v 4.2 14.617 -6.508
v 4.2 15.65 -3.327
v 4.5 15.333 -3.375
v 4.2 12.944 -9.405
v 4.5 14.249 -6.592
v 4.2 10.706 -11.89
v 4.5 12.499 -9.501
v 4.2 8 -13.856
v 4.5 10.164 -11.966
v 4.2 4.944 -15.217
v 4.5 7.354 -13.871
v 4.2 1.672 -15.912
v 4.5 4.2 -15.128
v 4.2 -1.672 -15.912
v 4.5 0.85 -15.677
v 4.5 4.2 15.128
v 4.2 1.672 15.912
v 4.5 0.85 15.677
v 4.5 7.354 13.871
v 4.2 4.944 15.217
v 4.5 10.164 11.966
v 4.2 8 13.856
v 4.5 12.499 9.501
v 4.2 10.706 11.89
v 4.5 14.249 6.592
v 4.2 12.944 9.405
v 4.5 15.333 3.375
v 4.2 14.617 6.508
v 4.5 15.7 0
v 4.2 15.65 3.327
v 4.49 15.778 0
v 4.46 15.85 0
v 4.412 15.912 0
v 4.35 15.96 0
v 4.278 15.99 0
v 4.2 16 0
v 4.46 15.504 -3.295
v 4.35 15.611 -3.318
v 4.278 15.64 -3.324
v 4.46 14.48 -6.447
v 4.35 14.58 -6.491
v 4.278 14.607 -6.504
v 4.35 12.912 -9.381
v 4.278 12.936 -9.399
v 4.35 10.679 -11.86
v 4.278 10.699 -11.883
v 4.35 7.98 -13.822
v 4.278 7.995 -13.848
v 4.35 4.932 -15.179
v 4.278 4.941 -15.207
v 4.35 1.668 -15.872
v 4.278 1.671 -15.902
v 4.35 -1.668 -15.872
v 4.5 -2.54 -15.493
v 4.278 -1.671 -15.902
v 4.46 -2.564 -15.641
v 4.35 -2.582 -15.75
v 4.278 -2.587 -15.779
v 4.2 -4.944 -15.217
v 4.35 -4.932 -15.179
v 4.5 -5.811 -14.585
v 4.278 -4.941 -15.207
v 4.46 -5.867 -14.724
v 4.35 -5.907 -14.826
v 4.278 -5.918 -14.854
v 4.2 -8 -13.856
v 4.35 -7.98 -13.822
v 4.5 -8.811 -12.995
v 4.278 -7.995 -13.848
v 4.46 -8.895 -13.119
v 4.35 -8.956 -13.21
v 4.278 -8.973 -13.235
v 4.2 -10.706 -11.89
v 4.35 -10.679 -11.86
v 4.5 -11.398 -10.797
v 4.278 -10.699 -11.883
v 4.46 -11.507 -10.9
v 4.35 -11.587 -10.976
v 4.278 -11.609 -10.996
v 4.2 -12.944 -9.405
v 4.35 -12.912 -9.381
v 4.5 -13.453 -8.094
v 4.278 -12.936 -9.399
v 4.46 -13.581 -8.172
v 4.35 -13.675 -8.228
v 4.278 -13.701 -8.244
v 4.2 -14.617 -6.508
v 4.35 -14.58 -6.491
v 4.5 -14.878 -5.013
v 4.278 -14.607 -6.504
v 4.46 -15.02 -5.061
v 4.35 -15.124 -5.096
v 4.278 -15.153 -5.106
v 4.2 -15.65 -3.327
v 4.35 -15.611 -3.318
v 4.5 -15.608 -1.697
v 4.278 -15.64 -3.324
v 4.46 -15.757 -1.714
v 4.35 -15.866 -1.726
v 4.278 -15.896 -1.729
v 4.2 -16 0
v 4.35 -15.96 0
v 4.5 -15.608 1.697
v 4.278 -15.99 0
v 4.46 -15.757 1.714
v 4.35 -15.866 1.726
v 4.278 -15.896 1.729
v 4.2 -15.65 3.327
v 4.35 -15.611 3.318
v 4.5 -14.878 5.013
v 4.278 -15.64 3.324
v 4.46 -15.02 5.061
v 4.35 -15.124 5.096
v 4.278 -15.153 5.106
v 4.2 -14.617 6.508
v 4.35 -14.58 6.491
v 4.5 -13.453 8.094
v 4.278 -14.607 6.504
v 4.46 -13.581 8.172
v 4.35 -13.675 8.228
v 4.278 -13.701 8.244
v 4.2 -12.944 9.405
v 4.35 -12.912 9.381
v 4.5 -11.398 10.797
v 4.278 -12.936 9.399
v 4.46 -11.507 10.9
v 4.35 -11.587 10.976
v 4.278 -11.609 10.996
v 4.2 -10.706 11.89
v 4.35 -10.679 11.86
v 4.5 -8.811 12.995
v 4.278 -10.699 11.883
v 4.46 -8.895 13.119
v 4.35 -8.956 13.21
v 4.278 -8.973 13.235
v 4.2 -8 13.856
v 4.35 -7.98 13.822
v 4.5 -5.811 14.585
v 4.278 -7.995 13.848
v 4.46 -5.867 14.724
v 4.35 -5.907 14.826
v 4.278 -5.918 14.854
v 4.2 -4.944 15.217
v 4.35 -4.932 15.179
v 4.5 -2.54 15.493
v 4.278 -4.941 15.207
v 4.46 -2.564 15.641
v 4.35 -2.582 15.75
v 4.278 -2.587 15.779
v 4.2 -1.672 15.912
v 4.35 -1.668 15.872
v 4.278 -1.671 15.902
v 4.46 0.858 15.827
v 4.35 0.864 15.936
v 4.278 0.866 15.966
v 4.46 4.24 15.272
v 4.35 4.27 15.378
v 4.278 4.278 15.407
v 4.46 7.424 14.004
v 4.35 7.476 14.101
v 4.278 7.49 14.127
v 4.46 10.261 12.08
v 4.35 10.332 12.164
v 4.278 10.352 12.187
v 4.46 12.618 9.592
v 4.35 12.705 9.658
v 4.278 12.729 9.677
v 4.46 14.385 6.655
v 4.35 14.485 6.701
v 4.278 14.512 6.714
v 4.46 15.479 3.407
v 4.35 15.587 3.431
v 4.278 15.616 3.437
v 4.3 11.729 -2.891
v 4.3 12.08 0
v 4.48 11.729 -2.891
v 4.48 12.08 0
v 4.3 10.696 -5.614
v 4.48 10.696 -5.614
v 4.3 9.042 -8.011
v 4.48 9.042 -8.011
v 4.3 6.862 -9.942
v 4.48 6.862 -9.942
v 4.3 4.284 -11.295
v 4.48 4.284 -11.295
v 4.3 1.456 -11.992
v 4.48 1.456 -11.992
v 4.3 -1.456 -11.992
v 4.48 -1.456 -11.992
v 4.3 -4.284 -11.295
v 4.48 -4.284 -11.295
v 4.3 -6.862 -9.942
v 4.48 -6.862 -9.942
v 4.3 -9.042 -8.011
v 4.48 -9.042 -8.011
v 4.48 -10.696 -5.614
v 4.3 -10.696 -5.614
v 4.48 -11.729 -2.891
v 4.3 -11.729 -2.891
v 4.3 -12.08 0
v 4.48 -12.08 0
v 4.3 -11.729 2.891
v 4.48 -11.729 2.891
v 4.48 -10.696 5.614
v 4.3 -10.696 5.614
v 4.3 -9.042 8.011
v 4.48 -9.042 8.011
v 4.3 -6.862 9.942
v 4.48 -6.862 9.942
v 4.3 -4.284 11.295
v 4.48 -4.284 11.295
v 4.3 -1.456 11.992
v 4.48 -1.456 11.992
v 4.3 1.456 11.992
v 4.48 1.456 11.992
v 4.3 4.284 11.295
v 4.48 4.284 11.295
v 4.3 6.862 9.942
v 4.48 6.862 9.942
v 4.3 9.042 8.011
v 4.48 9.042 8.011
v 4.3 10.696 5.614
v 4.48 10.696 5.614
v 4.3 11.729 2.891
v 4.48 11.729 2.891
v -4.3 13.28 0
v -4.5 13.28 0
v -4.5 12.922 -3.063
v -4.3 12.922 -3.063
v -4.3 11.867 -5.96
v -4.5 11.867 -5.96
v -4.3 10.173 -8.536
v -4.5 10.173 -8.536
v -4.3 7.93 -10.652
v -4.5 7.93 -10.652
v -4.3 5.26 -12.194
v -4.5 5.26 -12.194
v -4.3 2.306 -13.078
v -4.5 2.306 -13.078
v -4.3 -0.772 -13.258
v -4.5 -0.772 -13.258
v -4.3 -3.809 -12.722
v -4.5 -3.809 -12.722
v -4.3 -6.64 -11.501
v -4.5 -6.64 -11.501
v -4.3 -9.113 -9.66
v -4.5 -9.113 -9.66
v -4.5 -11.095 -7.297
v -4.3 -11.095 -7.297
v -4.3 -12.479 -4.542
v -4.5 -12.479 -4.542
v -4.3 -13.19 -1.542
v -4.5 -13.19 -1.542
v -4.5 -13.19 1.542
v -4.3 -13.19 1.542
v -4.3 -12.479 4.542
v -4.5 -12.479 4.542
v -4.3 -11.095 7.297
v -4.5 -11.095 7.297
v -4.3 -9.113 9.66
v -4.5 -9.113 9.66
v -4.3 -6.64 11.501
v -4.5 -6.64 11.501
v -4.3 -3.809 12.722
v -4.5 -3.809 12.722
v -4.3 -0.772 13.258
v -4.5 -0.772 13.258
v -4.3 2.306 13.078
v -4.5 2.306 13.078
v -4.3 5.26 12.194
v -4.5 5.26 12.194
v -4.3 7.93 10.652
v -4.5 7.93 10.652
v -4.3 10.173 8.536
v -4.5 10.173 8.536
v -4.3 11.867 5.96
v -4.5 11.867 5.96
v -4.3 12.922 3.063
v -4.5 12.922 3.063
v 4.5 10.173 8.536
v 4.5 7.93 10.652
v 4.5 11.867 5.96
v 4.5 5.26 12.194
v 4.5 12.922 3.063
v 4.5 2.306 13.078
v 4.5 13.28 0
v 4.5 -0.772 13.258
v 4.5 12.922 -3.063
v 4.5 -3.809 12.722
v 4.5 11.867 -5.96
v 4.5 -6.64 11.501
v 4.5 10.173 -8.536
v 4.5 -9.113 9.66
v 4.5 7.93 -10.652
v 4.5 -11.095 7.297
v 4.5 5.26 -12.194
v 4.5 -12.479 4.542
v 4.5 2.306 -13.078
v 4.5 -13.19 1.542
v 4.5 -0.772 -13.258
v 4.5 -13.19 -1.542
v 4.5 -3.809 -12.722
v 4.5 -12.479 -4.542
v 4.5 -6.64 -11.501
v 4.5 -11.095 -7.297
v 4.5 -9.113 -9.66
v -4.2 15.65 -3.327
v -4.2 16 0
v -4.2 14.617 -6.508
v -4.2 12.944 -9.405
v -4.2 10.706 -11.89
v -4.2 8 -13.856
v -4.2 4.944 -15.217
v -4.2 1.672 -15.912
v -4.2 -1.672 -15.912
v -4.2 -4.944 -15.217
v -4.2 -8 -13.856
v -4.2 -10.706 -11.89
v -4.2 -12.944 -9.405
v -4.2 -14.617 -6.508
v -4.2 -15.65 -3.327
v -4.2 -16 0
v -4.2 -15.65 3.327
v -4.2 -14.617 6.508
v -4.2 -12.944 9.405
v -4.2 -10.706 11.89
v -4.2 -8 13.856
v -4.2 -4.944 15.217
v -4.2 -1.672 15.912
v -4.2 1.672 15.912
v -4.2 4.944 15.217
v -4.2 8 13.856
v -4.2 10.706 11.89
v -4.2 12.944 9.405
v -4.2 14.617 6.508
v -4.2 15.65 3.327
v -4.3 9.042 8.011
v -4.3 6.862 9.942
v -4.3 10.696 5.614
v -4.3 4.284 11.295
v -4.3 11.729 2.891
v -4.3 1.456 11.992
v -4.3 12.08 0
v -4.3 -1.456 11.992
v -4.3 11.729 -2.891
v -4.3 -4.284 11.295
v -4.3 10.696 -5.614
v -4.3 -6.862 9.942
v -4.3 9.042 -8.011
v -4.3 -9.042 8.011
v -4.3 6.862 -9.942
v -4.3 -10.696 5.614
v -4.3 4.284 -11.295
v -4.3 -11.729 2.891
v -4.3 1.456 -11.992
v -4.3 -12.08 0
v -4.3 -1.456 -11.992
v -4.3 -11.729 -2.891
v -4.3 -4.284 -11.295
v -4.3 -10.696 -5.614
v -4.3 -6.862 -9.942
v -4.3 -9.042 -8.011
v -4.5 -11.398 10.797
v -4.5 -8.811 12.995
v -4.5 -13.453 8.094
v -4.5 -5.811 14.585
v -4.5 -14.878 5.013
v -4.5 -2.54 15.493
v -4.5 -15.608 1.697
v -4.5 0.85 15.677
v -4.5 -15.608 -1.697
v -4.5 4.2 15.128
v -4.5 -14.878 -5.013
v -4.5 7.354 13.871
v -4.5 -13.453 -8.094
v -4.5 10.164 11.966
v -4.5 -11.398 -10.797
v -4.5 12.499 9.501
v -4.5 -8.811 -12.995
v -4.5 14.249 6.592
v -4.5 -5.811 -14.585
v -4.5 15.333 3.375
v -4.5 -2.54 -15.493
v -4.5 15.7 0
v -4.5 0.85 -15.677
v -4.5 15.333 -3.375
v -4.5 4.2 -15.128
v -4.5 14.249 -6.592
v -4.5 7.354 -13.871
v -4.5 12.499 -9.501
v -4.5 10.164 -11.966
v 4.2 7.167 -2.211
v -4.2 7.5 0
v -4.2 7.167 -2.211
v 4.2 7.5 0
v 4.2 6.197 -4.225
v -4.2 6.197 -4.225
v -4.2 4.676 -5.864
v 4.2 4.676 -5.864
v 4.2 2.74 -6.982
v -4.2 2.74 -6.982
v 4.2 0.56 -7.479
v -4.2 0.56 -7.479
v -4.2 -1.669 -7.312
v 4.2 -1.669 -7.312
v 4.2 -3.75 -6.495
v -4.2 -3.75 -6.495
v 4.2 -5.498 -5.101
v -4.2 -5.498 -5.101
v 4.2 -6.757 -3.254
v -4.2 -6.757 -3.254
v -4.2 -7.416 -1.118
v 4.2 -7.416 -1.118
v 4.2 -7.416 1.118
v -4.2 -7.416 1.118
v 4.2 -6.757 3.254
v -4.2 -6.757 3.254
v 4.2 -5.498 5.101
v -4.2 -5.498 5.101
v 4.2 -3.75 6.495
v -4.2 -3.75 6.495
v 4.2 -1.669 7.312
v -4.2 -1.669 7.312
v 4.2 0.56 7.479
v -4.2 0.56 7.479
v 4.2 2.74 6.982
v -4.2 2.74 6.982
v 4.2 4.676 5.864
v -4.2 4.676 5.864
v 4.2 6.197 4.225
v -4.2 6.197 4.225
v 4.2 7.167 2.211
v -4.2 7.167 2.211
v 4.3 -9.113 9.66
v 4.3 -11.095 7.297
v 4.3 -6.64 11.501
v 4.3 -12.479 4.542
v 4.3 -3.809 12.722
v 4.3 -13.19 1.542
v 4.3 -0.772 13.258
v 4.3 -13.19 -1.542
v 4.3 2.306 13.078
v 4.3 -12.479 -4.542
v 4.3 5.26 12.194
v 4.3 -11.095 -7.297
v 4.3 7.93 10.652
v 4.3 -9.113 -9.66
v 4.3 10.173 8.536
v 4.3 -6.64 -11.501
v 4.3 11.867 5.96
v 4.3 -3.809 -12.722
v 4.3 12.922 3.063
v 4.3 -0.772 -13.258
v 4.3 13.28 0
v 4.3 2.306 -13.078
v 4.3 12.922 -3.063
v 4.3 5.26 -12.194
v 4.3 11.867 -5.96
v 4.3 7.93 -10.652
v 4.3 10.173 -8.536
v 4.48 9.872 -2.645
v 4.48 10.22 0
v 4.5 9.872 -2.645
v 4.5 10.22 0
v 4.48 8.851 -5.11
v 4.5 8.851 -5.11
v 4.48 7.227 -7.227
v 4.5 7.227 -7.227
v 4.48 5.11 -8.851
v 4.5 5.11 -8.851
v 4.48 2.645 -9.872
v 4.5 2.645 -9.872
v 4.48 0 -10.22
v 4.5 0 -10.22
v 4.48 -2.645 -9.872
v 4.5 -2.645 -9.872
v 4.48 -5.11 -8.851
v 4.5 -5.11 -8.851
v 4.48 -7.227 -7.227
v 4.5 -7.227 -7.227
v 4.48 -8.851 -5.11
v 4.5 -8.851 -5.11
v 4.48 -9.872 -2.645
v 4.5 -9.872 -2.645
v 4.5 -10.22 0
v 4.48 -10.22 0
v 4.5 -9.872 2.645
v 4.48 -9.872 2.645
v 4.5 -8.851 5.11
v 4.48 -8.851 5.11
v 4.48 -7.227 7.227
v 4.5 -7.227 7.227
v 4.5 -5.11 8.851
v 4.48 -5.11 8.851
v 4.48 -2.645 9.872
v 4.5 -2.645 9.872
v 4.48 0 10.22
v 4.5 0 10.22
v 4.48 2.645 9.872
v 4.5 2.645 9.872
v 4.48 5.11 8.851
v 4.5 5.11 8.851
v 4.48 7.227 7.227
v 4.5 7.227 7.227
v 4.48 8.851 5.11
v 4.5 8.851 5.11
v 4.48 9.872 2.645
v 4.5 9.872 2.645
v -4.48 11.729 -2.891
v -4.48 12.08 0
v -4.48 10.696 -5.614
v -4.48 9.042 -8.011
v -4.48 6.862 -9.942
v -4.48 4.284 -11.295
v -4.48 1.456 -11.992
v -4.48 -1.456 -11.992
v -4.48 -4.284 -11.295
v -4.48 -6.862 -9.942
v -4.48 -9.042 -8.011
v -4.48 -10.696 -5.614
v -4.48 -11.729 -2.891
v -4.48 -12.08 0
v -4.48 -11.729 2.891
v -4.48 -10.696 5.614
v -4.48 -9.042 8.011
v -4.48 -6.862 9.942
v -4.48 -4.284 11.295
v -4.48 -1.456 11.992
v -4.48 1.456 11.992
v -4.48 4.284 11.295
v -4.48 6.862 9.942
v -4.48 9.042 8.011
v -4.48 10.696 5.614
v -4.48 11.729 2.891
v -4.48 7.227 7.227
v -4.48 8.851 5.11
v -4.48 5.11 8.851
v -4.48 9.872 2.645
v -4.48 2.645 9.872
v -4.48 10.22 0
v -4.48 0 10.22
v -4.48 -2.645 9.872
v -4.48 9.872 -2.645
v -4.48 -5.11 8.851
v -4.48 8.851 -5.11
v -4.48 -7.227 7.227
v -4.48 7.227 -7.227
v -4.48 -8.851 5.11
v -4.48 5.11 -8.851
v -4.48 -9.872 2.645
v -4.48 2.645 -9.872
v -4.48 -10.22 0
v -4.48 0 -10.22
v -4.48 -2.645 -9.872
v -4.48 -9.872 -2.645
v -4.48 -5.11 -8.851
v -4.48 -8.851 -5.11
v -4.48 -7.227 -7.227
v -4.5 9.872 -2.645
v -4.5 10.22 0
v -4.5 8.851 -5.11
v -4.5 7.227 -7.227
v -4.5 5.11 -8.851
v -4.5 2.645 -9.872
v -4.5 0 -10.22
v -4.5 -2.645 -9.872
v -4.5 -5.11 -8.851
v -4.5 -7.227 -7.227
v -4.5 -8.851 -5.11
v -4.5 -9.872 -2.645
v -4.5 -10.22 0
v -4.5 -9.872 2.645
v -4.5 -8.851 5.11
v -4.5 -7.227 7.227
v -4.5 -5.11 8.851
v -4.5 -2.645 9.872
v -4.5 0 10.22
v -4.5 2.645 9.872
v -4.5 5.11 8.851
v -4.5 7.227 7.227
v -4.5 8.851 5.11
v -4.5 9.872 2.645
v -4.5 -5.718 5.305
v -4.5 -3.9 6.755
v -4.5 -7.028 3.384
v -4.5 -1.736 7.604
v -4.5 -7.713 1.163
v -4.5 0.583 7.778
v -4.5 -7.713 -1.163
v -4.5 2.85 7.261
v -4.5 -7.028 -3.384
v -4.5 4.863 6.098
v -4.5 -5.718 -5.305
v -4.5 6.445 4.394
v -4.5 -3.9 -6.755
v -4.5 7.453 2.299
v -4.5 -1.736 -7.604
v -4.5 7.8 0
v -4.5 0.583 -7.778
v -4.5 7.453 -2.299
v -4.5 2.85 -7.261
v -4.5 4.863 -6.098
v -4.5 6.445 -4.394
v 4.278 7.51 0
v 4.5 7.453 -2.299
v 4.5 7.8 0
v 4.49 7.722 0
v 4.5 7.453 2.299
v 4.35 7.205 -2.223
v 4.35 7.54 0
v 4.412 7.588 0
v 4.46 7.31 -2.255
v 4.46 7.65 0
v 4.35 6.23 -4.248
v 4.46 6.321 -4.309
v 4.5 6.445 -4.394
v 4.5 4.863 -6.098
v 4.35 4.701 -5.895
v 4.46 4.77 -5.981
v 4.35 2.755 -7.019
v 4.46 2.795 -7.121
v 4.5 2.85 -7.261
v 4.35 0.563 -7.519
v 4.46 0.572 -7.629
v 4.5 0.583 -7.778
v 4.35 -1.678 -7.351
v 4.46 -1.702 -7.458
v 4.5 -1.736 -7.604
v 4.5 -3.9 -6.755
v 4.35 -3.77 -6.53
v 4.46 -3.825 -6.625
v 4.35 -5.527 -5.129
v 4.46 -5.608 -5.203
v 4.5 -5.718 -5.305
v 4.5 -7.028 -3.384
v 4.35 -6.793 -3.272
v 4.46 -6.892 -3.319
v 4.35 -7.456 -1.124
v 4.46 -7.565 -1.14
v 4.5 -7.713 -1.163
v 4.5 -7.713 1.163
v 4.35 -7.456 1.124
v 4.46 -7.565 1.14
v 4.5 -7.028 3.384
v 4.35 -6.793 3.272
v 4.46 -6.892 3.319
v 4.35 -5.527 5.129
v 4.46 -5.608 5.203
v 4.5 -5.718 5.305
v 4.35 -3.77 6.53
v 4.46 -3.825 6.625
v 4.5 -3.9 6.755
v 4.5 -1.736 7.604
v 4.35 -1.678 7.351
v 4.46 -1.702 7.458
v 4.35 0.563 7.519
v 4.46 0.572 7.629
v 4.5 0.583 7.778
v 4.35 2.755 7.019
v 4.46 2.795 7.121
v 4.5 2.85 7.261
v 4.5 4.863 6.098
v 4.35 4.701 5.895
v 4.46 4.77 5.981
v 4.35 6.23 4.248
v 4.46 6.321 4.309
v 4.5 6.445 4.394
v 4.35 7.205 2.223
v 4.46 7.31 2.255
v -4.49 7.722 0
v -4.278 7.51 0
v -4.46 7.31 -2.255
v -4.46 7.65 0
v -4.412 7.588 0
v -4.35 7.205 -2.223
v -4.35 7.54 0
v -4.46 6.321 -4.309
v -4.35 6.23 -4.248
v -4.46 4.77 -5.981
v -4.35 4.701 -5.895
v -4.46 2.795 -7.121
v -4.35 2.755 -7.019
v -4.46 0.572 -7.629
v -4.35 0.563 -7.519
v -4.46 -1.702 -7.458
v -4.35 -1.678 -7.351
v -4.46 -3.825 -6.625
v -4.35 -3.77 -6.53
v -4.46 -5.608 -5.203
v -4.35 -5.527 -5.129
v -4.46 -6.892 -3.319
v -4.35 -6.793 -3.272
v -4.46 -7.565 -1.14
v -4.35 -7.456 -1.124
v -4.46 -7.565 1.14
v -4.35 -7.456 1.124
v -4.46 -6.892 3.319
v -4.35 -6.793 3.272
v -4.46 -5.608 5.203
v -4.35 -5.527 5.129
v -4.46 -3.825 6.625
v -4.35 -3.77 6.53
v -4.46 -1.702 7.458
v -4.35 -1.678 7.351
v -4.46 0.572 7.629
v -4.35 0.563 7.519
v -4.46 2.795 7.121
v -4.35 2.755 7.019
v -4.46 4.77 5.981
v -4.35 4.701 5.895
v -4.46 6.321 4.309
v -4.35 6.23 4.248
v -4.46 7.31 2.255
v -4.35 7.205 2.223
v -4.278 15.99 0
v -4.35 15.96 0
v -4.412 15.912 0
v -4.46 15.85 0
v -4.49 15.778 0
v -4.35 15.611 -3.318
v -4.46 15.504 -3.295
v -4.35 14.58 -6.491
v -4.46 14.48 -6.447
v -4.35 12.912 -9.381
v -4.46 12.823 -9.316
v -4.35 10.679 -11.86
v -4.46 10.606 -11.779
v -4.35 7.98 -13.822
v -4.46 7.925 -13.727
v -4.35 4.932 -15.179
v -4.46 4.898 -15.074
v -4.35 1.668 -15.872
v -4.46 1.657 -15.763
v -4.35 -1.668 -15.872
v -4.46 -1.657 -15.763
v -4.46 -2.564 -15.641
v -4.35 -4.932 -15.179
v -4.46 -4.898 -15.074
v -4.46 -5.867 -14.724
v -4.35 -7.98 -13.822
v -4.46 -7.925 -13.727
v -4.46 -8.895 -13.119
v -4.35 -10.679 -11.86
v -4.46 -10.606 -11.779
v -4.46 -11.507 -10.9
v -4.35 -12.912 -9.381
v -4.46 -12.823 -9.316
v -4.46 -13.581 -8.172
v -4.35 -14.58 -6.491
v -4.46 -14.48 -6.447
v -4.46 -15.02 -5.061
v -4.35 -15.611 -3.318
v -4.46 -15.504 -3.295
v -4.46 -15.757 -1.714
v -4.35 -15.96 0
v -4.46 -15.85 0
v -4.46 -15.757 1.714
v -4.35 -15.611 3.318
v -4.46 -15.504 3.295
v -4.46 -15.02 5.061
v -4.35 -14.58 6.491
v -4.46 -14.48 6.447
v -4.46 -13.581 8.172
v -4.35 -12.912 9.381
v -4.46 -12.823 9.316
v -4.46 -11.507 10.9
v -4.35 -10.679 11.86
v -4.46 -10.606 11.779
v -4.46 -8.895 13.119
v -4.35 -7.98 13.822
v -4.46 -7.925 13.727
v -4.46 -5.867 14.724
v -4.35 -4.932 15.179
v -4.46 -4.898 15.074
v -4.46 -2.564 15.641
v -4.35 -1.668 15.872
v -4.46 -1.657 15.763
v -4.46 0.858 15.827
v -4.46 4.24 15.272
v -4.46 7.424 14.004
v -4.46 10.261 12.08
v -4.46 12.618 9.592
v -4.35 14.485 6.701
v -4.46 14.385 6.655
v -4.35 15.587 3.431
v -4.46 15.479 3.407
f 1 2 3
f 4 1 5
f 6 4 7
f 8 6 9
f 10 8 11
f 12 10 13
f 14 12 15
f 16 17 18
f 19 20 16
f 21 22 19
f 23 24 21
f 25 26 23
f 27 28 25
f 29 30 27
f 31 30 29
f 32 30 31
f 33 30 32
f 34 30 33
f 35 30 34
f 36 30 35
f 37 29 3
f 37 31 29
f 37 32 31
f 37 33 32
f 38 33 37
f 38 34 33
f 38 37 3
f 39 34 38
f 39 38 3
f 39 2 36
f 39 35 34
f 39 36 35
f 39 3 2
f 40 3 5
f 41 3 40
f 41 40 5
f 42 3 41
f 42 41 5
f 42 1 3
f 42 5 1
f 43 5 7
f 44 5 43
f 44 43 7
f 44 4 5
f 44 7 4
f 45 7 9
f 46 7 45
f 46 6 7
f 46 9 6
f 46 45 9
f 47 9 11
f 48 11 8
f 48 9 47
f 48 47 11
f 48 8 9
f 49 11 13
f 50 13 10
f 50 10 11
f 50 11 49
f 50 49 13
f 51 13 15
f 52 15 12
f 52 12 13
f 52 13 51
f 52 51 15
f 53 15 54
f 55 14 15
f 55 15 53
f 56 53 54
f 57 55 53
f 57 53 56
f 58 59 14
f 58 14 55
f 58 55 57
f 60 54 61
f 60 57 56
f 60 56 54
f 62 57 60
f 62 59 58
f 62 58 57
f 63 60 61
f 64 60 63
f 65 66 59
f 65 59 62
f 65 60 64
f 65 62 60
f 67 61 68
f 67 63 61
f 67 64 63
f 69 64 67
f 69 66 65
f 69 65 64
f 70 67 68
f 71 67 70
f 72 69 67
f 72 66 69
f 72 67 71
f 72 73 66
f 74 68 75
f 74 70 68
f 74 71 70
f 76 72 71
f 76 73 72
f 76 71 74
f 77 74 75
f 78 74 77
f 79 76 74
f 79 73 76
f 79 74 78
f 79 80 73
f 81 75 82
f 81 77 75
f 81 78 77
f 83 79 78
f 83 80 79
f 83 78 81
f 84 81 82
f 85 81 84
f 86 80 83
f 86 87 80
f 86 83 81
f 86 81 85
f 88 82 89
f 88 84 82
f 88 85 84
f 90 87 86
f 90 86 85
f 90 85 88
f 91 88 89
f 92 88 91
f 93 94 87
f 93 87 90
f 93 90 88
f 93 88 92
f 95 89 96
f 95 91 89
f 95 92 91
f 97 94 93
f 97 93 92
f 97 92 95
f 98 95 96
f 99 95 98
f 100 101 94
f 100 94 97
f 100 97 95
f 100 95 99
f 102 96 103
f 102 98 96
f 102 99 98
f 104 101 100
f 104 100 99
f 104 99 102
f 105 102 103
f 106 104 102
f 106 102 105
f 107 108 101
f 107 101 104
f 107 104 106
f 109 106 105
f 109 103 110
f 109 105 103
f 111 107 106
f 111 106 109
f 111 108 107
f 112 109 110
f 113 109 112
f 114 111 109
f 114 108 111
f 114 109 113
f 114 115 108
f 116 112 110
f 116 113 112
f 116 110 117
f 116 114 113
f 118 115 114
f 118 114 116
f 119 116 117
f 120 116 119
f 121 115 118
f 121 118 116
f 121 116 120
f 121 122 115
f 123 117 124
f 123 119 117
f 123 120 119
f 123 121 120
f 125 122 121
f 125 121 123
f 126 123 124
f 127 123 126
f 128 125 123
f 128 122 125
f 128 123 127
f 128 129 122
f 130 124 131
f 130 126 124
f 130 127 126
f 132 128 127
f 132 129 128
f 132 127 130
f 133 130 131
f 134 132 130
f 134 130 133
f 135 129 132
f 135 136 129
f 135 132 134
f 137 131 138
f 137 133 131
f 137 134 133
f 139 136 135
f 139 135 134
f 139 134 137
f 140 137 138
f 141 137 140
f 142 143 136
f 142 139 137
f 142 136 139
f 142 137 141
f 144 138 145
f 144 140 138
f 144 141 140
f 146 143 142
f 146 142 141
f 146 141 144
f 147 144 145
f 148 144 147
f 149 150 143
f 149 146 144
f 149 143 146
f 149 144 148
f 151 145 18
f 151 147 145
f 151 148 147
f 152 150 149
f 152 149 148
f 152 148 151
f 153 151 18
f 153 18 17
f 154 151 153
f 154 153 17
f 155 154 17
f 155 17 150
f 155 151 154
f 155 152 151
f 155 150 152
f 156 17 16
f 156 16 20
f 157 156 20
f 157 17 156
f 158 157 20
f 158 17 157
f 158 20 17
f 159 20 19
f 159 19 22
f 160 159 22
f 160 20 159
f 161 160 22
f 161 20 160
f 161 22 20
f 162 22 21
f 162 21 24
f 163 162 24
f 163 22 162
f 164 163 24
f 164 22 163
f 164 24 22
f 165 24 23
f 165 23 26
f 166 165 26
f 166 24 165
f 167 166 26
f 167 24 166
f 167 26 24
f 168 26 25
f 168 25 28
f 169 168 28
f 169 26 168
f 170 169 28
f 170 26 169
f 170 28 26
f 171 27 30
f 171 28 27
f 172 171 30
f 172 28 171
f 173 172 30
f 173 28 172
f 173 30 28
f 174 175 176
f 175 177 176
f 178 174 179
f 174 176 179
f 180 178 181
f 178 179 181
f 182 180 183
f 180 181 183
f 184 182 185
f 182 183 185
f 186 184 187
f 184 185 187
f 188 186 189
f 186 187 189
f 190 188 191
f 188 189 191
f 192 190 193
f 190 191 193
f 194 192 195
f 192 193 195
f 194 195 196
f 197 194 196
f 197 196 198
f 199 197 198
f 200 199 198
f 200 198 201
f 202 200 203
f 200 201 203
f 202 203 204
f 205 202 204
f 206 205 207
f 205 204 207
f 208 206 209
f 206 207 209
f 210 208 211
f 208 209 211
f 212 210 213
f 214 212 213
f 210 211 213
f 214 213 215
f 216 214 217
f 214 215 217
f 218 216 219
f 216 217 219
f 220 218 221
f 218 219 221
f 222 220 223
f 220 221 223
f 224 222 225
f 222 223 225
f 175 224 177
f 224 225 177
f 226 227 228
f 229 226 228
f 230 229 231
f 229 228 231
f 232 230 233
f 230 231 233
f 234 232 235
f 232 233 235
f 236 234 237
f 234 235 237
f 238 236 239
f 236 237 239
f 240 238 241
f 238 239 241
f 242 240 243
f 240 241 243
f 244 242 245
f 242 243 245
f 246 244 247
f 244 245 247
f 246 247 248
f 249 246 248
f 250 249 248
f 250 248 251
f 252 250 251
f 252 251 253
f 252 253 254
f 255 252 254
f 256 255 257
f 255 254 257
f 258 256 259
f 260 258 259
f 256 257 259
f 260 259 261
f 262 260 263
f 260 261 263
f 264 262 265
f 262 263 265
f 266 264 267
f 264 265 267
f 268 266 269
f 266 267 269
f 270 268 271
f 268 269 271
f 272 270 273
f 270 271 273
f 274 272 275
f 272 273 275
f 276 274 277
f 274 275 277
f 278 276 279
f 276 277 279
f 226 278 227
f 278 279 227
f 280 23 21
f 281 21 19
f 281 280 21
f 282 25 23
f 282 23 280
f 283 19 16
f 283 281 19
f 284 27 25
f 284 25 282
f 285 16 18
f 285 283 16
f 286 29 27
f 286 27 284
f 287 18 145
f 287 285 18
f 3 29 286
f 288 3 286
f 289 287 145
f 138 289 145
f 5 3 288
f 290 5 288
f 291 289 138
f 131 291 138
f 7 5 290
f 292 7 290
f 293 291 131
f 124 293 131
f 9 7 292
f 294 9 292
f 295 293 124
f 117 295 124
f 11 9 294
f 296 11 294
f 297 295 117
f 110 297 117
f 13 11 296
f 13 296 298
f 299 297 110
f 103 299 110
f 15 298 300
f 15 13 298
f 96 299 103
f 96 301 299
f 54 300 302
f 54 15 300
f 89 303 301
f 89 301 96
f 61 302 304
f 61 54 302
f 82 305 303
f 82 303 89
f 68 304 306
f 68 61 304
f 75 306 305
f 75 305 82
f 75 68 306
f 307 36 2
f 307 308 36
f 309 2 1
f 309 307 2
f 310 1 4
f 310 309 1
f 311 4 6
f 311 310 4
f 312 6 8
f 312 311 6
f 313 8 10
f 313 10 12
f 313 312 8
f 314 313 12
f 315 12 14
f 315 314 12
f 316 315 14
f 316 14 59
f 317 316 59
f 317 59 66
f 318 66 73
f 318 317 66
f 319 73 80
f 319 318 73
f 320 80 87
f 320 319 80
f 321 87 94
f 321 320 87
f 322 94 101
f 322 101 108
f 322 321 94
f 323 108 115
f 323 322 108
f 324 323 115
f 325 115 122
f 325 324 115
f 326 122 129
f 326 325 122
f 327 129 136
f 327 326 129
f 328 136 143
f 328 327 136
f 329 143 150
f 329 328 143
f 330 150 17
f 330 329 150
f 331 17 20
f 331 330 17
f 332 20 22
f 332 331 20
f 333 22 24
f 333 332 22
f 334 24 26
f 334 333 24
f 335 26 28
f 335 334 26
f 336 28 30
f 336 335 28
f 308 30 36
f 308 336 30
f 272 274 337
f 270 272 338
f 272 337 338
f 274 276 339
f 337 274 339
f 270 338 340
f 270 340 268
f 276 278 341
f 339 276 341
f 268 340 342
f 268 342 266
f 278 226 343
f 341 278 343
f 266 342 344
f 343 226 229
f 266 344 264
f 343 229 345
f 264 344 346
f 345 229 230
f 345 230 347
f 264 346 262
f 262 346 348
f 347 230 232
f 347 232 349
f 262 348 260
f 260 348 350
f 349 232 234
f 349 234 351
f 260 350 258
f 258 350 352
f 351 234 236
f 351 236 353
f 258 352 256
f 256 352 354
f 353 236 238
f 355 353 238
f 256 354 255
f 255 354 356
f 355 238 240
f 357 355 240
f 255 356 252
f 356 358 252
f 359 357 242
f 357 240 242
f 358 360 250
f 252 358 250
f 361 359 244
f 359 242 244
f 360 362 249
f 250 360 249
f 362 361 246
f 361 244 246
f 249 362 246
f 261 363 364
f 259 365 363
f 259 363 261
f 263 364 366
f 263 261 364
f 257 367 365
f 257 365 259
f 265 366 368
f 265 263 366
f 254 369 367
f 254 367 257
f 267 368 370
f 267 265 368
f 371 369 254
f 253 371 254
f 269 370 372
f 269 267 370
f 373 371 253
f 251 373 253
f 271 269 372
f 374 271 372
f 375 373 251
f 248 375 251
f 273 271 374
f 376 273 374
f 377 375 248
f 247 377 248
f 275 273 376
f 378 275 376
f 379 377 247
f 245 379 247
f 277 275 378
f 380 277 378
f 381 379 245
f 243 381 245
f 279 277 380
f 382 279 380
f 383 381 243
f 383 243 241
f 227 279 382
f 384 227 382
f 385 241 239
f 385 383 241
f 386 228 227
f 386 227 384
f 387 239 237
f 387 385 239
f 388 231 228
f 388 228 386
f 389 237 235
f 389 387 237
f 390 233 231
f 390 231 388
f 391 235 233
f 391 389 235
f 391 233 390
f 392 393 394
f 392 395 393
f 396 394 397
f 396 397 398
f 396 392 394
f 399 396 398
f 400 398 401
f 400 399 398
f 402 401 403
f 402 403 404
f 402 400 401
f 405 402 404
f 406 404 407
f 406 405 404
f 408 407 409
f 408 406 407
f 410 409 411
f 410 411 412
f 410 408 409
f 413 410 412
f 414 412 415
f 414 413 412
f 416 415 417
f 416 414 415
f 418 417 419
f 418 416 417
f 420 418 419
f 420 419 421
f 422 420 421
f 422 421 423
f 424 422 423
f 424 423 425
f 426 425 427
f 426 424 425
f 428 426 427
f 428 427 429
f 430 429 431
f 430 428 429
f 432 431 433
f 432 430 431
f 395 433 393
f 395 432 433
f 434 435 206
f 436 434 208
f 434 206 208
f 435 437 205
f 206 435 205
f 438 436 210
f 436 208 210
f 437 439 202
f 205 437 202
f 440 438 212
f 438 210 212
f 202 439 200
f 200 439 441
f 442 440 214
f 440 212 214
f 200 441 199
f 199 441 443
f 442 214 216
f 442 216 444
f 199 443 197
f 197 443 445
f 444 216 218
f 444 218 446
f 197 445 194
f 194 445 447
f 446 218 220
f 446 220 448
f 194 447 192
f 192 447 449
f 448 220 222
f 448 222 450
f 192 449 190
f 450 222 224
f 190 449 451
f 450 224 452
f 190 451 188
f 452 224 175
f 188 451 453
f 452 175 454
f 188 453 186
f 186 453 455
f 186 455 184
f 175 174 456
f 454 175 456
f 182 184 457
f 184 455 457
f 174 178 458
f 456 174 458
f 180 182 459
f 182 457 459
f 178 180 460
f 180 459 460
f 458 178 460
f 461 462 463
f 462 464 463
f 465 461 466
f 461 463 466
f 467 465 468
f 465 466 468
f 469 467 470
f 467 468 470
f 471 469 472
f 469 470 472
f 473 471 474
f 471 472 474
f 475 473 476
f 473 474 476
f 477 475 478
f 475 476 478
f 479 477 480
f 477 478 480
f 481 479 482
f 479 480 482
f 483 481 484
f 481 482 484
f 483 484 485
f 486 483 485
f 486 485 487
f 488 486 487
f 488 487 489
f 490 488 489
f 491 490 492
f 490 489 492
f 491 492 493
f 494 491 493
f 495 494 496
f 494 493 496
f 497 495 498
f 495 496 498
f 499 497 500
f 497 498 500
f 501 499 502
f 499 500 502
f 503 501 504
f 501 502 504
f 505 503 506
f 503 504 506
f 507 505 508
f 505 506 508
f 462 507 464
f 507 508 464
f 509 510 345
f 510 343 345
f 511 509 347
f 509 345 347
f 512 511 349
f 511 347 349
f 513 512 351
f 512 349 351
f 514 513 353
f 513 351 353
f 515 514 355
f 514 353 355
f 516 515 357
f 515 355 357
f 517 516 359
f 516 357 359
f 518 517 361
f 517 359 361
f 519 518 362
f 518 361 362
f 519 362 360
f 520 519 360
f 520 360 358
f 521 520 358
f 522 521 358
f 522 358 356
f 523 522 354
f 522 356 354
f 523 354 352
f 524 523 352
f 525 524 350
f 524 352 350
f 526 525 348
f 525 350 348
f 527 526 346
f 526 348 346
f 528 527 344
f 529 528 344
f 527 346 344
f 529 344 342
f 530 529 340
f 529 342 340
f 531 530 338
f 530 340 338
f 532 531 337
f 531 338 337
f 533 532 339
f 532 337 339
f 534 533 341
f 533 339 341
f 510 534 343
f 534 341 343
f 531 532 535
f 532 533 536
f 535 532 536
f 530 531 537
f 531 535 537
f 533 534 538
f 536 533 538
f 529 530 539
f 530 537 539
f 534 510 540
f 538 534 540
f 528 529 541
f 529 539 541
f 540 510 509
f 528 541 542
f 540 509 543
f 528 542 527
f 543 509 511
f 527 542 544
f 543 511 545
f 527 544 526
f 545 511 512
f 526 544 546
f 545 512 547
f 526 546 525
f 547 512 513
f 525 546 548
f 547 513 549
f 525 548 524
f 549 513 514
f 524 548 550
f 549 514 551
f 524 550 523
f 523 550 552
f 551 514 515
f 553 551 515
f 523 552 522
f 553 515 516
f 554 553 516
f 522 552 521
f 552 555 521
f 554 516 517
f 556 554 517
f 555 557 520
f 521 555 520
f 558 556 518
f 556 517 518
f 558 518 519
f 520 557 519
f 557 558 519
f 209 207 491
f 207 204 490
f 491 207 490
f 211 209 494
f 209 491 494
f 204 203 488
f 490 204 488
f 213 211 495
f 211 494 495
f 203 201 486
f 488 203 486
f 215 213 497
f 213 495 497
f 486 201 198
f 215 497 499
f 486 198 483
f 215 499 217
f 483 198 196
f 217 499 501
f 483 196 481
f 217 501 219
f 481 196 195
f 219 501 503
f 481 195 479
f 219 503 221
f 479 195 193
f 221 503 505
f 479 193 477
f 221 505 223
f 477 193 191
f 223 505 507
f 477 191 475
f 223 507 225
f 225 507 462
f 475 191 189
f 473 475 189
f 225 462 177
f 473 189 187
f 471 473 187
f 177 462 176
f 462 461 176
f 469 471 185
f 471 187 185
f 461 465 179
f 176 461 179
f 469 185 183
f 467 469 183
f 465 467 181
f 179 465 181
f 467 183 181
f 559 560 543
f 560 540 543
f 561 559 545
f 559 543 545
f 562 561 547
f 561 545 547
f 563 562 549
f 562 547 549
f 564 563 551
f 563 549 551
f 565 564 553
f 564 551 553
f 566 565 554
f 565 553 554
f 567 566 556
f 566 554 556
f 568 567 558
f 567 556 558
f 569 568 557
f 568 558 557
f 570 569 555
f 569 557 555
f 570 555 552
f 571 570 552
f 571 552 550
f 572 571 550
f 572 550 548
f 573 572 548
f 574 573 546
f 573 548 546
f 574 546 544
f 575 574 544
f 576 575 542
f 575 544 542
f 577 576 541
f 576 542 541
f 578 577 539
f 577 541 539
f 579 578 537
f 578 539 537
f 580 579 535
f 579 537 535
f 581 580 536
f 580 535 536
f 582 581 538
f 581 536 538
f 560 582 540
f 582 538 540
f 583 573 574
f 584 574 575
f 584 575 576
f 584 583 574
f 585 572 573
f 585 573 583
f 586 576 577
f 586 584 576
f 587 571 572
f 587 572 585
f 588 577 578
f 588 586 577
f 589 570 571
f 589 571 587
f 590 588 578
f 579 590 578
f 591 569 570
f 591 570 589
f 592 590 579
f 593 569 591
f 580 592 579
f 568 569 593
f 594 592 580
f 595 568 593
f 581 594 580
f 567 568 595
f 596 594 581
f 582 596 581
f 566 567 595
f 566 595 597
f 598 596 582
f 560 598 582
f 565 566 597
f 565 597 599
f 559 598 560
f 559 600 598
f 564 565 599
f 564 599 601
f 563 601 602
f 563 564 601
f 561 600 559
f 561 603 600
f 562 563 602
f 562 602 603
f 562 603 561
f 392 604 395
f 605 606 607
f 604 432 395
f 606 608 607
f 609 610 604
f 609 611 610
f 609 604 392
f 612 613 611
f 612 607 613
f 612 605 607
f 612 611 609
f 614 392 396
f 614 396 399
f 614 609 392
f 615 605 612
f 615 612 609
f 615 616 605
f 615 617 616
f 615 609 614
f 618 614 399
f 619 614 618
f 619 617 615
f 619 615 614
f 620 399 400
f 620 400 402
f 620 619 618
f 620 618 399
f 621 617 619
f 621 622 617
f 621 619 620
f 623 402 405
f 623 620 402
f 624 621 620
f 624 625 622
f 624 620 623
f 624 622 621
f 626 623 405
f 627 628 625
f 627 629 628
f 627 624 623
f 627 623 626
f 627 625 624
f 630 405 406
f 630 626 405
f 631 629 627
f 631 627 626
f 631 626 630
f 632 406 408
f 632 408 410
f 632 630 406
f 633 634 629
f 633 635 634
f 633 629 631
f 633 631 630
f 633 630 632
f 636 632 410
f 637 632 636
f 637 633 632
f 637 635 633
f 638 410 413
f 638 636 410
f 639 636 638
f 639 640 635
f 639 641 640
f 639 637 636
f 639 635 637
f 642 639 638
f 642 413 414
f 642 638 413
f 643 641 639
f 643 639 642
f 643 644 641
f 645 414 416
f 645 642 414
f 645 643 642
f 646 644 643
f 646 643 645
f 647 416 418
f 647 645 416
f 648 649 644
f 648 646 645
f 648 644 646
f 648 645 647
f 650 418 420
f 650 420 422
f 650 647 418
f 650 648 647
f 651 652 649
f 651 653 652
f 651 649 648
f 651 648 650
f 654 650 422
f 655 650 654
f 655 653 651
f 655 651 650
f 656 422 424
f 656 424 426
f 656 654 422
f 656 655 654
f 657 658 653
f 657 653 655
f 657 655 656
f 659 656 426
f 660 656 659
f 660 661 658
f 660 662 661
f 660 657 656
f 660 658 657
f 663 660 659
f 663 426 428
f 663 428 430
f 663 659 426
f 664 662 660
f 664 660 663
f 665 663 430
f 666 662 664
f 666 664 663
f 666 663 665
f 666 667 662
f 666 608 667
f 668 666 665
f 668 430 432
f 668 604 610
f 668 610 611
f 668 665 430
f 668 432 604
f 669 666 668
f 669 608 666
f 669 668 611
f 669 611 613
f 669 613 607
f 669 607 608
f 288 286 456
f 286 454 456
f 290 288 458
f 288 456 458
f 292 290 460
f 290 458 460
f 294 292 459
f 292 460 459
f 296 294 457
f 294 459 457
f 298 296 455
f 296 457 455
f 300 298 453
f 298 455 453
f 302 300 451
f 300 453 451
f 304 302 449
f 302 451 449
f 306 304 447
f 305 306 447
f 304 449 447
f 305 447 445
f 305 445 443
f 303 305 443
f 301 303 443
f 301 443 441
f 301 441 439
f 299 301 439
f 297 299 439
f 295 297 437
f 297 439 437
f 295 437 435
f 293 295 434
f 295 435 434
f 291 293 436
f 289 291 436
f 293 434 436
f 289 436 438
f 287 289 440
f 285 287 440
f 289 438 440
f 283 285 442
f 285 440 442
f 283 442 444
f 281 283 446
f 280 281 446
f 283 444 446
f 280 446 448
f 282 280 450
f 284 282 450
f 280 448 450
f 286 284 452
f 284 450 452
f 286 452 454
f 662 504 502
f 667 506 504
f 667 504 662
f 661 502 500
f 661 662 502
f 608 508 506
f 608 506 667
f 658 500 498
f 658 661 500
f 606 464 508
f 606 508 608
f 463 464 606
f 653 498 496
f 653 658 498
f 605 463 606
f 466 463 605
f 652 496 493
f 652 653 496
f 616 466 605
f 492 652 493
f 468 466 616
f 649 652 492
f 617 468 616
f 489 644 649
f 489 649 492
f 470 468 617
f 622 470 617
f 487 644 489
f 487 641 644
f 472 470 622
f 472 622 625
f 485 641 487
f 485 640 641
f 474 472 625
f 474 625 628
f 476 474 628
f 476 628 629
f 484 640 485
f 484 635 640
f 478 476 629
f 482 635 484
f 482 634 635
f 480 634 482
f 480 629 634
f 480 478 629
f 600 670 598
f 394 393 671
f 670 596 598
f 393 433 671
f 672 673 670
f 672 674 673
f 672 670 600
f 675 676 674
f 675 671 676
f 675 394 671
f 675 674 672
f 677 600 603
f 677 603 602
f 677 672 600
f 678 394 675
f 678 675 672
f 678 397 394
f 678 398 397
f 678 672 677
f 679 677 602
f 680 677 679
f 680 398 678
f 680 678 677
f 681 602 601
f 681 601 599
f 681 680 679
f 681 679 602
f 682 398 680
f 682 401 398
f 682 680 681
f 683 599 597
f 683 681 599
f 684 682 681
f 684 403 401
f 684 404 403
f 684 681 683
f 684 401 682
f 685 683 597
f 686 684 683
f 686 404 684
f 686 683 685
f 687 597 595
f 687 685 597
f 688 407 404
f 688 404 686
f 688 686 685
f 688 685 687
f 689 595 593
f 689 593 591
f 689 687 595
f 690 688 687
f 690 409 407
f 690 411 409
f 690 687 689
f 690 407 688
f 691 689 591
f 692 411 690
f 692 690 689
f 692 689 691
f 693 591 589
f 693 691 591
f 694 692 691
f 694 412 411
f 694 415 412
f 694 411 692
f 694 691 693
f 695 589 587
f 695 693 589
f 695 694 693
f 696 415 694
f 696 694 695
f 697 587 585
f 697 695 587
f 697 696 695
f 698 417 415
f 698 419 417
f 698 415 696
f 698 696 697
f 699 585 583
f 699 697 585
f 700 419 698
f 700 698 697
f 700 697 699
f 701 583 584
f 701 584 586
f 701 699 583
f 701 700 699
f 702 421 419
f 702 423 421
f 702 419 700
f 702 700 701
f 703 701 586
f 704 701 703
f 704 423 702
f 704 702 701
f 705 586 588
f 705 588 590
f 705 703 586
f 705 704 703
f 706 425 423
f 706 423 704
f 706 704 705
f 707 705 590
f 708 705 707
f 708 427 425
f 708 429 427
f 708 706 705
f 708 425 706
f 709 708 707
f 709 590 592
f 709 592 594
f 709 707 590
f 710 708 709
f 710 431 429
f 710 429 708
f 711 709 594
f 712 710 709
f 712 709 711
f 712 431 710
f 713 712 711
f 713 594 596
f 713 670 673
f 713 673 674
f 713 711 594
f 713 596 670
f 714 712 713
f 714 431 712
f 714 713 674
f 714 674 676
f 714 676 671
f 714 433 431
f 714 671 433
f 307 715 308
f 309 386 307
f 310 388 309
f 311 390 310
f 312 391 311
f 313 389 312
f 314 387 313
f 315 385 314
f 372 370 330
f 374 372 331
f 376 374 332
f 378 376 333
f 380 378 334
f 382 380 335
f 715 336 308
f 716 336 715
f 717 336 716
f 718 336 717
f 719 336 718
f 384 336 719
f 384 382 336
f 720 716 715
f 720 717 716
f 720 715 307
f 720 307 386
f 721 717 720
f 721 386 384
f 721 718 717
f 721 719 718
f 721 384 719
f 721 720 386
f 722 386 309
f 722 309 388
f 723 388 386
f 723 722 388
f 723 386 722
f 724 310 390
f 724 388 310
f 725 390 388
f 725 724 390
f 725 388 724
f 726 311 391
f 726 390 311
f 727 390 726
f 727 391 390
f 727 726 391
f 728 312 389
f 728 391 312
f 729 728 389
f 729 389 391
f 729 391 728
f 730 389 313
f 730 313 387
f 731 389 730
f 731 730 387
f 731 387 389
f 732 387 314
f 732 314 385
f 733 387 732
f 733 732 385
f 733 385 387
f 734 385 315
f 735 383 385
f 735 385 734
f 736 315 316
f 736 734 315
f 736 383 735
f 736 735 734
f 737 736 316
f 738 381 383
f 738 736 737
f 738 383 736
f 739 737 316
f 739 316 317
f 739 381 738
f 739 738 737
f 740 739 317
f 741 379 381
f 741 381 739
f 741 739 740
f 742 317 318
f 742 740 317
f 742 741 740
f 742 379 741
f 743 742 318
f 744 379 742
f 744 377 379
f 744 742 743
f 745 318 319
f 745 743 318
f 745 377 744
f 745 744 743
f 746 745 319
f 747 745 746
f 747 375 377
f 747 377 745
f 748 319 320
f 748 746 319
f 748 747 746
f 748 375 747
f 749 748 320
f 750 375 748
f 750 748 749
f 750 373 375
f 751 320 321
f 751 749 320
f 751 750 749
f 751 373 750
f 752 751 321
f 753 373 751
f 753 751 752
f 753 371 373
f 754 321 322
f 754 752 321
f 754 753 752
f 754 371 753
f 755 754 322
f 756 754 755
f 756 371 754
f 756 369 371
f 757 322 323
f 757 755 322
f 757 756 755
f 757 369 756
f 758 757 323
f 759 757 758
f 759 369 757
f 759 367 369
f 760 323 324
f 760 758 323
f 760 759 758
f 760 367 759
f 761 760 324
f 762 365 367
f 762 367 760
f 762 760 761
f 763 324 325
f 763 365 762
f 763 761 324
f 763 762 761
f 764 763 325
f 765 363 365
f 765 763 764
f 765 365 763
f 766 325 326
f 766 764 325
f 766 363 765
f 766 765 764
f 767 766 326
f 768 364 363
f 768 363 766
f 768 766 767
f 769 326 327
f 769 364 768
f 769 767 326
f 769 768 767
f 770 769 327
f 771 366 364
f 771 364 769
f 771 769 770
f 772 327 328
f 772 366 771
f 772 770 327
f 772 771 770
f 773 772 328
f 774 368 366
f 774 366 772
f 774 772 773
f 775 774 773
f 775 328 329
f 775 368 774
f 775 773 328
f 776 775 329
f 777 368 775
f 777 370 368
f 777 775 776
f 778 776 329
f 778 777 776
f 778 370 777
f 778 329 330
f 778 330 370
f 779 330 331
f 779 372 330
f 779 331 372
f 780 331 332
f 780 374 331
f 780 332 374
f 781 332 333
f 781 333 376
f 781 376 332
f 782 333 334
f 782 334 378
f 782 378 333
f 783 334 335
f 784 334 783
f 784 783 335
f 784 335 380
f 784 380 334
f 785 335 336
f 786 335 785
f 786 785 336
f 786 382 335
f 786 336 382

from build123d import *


with BuildPart() as part:
    # Sketch1 → Revolve1 (revolve)
    with BuildSketch(Plane.XY):
        with BuildLine():
            Line((-4.5, 15.7), (-4.5, 7.8))
            ThreePointArc((-4.5, 7.8), (-4.412132034, 7.587867966), (-4.2, 7.5))
            Line((-4.2, 7.5), (4.2, 7.5))
            ThreePointArc((4.2, 7.5), (4.412132034, 7.587867966), (4.5, 7.8))
            Line((4.5, 7.8), (4.5, 15.7))
            ThreePointArc((4.5, 15.7), (4.412132034, 15.912132034), (4.2, 16))
            Line((4.2, 16), (-4.2, 16))
            ThreePointArc((-4.2, 16), (-4.412132034, 15.912132034), (-4.5, 15.7))
        make_face()
    revolve(axis=Axis((50, 0, 0), (-1, 0, 0)))

    # Sketch2 → Cut-Revolve1 (revolve, cut)
    with BuildSketch(Plane.XY):
        Polygon((-6.3, 7.5), (-4.5, 7.5), (-4.5, 10.22), (-4.48, 10.22), (-4.48, 12.08), (-4.3, 12.08), (-4.3, 13.28), (-6.3, 13.28), align=None)
    revolve(axis=Axis((50, 0, 0), (-1, 0, 0)), mode=Mode.SUBTRACT)

    # Sketch3 → Cut-Revolve2 (revolve, cut)
    with BuildSketch(Plane.XY):
        Polygon((4.3, 13.28), (4.3, 12.08), (4.48, 12.08), (4.48, 10.22), (4.5, 10.22), (4.5, 7.5), (6.3, 7.5), (6.3, 13.28), align=None)
    revolve(axis=Axis((50, 0, 0), (-1, 0, 0)), mode=Mode.SUBTRACT)


solid = part.part
